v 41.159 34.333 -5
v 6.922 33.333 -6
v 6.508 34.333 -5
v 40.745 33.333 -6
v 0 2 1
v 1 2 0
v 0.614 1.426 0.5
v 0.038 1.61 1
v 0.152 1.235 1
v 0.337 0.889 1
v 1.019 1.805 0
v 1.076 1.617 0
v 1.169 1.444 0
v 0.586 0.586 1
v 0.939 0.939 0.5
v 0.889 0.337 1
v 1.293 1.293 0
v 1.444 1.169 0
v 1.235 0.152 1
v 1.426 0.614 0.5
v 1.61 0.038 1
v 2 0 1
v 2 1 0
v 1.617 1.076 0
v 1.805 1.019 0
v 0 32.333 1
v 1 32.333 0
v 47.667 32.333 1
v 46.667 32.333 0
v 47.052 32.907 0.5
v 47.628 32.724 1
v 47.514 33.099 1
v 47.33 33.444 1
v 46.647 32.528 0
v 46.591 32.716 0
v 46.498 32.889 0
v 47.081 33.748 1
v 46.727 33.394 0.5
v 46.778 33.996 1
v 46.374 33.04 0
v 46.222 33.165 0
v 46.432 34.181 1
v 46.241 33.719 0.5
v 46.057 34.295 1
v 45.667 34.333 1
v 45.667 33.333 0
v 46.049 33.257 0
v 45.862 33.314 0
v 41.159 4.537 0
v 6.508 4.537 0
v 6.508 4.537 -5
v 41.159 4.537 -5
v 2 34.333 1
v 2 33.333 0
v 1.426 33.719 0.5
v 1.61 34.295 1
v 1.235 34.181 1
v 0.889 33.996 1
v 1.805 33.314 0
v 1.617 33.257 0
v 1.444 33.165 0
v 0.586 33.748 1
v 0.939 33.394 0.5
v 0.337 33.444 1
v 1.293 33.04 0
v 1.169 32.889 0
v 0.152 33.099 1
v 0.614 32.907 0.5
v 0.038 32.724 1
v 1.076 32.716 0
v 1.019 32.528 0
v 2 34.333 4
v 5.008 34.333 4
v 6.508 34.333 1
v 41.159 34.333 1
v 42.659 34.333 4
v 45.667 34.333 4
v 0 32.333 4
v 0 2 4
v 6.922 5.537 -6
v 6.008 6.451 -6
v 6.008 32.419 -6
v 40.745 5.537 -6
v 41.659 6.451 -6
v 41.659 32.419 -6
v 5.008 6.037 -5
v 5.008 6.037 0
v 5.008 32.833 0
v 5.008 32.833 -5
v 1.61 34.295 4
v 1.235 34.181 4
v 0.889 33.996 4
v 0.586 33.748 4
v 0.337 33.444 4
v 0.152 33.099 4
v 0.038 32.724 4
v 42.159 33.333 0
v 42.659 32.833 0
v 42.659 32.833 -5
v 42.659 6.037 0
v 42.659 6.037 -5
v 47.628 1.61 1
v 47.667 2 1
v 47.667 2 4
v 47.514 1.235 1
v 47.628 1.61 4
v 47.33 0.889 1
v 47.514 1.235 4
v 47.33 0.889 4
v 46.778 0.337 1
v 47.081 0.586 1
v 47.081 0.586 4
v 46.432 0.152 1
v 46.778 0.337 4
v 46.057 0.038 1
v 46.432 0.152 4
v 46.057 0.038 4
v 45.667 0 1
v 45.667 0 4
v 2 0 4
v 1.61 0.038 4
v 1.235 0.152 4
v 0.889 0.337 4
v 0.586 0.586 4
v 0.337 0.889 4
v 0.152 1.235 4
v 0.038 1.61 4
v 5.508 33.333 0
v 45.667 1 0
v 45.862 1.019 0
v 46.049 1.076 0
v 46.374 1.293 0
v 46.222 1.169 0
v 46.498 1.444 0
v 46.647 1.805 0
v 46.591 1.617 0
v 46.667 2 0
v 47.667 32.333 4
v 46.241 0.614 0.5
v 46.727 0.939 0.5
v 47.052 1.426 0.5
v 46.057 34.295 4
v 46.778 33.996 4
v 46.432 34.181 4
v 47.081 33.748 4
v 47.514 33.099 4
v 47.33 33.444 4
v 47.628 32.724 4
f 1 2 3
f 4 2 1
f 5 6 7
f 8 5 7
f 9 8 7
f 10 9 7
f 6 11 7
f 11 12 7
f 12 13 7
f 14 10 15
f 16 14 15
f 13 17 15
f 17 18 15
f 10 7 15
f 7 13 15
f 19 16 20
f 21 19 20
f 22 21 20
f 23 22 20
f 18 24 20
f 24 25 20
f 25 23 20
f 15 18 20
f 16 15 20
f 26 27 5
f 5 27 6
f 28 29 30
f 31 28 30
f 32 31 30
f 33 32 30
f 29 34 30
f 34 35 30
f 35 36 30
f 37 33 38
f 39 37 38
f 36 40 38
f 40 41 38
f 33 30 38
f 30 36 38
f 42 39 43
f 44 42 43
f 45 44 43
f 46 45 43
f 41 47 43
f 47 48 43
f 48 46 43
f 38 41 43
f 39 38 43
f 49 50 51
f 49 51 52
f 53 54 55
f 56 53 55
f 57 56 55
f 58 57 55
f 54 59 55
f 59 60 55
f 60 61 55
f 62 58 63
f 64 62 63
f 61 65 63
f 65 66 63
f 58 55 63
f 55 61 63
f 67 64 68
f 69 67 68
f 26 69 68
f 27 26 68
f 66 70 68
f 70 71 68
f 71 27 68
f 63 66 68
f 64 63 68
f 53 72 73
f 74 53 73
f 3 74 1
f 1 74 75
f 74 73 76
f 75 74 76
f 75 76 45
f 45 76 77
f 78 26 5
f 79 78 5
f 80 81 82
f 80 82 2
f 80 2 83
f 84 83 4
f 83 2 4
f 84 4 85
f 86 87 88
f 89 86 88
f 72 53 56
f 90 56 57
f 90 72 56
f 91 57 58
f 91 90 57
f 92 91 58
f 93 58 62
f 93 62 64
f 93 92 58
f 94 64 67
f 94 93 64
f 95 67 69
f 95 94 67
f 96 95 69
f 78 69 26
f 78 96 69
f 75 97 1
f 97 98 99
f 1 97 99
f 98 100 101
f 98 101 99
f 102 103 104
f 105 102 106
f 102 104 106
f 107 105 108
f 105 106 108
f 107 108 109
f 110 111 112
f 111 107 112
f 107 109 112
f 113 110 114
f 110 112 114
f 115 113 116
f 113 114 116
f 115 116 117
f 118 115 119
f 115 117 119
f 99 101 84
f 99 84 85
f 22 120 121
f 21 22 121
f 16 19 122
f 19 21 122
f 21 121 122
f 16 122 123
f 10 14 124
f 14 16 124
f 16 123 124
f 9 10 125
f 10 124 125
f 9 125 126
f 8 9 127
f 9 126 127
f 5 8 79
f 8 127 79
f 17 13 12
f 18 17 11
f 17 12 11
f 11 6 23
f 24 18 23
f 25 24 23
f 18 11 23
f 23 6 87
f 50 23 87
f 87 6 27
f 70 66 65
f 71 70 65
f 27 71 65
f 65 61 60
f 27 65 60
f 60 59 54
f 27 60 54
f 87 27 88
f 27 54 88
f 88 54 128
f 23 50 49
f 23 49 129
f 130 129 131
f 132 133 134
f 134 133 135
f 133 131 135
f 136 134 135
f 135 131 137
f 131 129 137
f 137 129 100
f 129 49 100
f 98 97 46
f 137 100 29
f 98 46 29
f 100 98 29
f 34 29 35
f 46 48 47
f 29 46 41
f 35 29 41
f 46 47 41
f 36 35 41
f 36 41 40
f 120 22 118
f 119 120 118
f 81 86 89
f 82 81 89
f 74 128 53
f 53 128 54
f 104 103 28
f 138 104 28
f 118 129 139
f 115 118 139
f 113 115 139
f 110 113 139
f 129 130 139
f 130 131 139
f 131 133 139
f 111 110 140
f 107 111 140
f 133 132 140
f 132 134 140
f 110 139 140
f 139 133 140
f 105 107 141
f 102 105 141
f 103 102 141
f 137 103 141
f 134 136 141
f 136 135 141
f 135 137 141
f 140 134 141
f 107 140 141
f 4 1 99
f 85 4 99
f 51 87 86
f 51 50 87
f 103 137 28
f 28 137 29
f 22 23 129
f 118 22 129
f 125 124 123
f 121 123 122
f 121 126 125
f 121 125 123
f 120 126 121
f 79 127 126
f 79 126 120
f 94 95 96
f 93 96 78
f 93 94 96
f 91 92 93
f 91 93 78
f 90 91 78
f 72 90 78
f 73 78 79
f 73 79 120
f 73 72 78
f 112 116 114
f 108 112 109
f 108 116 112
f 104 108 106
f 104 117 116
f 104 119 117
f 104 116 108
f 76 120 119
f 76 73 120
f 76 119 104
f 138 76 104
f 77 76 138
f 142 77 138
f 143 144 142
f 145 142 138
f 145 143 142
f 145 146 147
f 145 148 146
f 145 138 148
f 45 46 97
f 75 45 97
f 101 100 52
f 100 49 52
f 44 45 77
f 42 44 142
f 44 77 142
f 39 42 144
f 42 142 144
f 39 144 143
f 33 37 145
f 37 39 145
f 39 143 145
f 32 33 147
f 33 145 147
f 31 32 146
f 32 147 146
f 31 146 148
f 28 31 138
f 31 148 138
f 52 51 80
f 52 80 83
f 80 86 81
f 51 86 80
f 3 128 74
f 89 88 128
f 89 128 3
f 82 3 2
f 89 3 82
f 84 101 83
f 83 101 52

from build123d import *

# Parameters (mm, degrees)
SKETCH1_W           = 47.666666667
SKETCH1_H           = 34.333333333
BOSS_EXTRUDE1_DEPTH = 4
SKETCH1_3_W         = 37.651513934
SKETCH1_3_H         = 29.796380505
BOSS_EXTRUDE2_DEPTH = 6
FILLET1_R           = 2
CHAMFER1_SIZE       = 1.5
CHAMFER2_SIZE       = 1
CHAMFER3_SIZE       = 1


with BuildPart() as part:
    # Sketch1 → Boss-Extrude1 (new body)
    with BuildSketch(Plane.XY):
        with Locations((23.833333334, 17.166666666)):
            Rectangle(SKETCH1_W, SKETCH1_H)
    extrude(amount=BOSS_EXTRUDE1_DEPTH)

    # Sketch1<3> → Boss-Extrude2 (add)
    with BuildSketch(Plane.XY):
        with Locations((23.833333333, 19.43514308)):
            Rectangle(SKETCH1_3_W, SKETCH1_3_H)
    extrude(amount=-BOSS_EXTRUDE2_DEPTH)

    # Fillet1
    fillet1_edges = [part.edges().sort_by_distance(p)[0] for p in [
        (0, 34.333333333, 2),
        (47.666666667, 34.333333333, 2),
        (0, 0, 2),
        (47.666666667, 0, 2),
    ]]
    fillet(fillet1_edges, radius=FILLET1_R)

    # Chamfer1
    chamfer1_edges = [part.edges().sort_by_distance(p)[0] for p in [
        (5.007576366, 34.333333333, -3),
        (42.6590903, 34.333333333, -3),
        (42.6590903, 4.536952828, -3),
        (5.007576366, 4.536952828, -3),
    ]]
    chamfer(chamfer1_edges, length=CHAMFER1_SIZE)

    # Chamfer2
    chamfer2_edges = [part.edges().sort_by_distance(p)[0] for p in [
        (41.9090903, 33.583333333, -6),
        (23.833333333, 34.333333333, -6),
        (5.757576366, 33.583333333, -6),
        (5.007576366, 19.435143081, -6),
        (5.757576366, 5.286952828, -6),
        (42.6590903, 19.435143081, -6),
        (41.9090903, 5.286952828, -6),
        (23.833333333, 4.536952828, -6),
    ]]
    chamfer(chamfer2_edges, length=CHAMFER2_SIZE)

    # Chamfer3
    chamfer3_edges = [part.edges().sort_by_distance(p)[0] for p in [
        (4.253788183, 34.333333333, 0),
        (0.585786438, 33.747546896, 0),
        (0, 17.166666667, 0),
        (0.585786438, 0.585786438, 0),
        (23.833333333, 0, 0),
        (47.080880229, 0.585786438, 0),
        (47.666666667, 17.166666667, 0),
        (47.080880229, 33.747546896, 0),
        (43.412878483, 34.333333333, 0),
    ]]
    chamfer(chamfer3_edges, length=CHAMFER3_SIZE)


solid = part.part
